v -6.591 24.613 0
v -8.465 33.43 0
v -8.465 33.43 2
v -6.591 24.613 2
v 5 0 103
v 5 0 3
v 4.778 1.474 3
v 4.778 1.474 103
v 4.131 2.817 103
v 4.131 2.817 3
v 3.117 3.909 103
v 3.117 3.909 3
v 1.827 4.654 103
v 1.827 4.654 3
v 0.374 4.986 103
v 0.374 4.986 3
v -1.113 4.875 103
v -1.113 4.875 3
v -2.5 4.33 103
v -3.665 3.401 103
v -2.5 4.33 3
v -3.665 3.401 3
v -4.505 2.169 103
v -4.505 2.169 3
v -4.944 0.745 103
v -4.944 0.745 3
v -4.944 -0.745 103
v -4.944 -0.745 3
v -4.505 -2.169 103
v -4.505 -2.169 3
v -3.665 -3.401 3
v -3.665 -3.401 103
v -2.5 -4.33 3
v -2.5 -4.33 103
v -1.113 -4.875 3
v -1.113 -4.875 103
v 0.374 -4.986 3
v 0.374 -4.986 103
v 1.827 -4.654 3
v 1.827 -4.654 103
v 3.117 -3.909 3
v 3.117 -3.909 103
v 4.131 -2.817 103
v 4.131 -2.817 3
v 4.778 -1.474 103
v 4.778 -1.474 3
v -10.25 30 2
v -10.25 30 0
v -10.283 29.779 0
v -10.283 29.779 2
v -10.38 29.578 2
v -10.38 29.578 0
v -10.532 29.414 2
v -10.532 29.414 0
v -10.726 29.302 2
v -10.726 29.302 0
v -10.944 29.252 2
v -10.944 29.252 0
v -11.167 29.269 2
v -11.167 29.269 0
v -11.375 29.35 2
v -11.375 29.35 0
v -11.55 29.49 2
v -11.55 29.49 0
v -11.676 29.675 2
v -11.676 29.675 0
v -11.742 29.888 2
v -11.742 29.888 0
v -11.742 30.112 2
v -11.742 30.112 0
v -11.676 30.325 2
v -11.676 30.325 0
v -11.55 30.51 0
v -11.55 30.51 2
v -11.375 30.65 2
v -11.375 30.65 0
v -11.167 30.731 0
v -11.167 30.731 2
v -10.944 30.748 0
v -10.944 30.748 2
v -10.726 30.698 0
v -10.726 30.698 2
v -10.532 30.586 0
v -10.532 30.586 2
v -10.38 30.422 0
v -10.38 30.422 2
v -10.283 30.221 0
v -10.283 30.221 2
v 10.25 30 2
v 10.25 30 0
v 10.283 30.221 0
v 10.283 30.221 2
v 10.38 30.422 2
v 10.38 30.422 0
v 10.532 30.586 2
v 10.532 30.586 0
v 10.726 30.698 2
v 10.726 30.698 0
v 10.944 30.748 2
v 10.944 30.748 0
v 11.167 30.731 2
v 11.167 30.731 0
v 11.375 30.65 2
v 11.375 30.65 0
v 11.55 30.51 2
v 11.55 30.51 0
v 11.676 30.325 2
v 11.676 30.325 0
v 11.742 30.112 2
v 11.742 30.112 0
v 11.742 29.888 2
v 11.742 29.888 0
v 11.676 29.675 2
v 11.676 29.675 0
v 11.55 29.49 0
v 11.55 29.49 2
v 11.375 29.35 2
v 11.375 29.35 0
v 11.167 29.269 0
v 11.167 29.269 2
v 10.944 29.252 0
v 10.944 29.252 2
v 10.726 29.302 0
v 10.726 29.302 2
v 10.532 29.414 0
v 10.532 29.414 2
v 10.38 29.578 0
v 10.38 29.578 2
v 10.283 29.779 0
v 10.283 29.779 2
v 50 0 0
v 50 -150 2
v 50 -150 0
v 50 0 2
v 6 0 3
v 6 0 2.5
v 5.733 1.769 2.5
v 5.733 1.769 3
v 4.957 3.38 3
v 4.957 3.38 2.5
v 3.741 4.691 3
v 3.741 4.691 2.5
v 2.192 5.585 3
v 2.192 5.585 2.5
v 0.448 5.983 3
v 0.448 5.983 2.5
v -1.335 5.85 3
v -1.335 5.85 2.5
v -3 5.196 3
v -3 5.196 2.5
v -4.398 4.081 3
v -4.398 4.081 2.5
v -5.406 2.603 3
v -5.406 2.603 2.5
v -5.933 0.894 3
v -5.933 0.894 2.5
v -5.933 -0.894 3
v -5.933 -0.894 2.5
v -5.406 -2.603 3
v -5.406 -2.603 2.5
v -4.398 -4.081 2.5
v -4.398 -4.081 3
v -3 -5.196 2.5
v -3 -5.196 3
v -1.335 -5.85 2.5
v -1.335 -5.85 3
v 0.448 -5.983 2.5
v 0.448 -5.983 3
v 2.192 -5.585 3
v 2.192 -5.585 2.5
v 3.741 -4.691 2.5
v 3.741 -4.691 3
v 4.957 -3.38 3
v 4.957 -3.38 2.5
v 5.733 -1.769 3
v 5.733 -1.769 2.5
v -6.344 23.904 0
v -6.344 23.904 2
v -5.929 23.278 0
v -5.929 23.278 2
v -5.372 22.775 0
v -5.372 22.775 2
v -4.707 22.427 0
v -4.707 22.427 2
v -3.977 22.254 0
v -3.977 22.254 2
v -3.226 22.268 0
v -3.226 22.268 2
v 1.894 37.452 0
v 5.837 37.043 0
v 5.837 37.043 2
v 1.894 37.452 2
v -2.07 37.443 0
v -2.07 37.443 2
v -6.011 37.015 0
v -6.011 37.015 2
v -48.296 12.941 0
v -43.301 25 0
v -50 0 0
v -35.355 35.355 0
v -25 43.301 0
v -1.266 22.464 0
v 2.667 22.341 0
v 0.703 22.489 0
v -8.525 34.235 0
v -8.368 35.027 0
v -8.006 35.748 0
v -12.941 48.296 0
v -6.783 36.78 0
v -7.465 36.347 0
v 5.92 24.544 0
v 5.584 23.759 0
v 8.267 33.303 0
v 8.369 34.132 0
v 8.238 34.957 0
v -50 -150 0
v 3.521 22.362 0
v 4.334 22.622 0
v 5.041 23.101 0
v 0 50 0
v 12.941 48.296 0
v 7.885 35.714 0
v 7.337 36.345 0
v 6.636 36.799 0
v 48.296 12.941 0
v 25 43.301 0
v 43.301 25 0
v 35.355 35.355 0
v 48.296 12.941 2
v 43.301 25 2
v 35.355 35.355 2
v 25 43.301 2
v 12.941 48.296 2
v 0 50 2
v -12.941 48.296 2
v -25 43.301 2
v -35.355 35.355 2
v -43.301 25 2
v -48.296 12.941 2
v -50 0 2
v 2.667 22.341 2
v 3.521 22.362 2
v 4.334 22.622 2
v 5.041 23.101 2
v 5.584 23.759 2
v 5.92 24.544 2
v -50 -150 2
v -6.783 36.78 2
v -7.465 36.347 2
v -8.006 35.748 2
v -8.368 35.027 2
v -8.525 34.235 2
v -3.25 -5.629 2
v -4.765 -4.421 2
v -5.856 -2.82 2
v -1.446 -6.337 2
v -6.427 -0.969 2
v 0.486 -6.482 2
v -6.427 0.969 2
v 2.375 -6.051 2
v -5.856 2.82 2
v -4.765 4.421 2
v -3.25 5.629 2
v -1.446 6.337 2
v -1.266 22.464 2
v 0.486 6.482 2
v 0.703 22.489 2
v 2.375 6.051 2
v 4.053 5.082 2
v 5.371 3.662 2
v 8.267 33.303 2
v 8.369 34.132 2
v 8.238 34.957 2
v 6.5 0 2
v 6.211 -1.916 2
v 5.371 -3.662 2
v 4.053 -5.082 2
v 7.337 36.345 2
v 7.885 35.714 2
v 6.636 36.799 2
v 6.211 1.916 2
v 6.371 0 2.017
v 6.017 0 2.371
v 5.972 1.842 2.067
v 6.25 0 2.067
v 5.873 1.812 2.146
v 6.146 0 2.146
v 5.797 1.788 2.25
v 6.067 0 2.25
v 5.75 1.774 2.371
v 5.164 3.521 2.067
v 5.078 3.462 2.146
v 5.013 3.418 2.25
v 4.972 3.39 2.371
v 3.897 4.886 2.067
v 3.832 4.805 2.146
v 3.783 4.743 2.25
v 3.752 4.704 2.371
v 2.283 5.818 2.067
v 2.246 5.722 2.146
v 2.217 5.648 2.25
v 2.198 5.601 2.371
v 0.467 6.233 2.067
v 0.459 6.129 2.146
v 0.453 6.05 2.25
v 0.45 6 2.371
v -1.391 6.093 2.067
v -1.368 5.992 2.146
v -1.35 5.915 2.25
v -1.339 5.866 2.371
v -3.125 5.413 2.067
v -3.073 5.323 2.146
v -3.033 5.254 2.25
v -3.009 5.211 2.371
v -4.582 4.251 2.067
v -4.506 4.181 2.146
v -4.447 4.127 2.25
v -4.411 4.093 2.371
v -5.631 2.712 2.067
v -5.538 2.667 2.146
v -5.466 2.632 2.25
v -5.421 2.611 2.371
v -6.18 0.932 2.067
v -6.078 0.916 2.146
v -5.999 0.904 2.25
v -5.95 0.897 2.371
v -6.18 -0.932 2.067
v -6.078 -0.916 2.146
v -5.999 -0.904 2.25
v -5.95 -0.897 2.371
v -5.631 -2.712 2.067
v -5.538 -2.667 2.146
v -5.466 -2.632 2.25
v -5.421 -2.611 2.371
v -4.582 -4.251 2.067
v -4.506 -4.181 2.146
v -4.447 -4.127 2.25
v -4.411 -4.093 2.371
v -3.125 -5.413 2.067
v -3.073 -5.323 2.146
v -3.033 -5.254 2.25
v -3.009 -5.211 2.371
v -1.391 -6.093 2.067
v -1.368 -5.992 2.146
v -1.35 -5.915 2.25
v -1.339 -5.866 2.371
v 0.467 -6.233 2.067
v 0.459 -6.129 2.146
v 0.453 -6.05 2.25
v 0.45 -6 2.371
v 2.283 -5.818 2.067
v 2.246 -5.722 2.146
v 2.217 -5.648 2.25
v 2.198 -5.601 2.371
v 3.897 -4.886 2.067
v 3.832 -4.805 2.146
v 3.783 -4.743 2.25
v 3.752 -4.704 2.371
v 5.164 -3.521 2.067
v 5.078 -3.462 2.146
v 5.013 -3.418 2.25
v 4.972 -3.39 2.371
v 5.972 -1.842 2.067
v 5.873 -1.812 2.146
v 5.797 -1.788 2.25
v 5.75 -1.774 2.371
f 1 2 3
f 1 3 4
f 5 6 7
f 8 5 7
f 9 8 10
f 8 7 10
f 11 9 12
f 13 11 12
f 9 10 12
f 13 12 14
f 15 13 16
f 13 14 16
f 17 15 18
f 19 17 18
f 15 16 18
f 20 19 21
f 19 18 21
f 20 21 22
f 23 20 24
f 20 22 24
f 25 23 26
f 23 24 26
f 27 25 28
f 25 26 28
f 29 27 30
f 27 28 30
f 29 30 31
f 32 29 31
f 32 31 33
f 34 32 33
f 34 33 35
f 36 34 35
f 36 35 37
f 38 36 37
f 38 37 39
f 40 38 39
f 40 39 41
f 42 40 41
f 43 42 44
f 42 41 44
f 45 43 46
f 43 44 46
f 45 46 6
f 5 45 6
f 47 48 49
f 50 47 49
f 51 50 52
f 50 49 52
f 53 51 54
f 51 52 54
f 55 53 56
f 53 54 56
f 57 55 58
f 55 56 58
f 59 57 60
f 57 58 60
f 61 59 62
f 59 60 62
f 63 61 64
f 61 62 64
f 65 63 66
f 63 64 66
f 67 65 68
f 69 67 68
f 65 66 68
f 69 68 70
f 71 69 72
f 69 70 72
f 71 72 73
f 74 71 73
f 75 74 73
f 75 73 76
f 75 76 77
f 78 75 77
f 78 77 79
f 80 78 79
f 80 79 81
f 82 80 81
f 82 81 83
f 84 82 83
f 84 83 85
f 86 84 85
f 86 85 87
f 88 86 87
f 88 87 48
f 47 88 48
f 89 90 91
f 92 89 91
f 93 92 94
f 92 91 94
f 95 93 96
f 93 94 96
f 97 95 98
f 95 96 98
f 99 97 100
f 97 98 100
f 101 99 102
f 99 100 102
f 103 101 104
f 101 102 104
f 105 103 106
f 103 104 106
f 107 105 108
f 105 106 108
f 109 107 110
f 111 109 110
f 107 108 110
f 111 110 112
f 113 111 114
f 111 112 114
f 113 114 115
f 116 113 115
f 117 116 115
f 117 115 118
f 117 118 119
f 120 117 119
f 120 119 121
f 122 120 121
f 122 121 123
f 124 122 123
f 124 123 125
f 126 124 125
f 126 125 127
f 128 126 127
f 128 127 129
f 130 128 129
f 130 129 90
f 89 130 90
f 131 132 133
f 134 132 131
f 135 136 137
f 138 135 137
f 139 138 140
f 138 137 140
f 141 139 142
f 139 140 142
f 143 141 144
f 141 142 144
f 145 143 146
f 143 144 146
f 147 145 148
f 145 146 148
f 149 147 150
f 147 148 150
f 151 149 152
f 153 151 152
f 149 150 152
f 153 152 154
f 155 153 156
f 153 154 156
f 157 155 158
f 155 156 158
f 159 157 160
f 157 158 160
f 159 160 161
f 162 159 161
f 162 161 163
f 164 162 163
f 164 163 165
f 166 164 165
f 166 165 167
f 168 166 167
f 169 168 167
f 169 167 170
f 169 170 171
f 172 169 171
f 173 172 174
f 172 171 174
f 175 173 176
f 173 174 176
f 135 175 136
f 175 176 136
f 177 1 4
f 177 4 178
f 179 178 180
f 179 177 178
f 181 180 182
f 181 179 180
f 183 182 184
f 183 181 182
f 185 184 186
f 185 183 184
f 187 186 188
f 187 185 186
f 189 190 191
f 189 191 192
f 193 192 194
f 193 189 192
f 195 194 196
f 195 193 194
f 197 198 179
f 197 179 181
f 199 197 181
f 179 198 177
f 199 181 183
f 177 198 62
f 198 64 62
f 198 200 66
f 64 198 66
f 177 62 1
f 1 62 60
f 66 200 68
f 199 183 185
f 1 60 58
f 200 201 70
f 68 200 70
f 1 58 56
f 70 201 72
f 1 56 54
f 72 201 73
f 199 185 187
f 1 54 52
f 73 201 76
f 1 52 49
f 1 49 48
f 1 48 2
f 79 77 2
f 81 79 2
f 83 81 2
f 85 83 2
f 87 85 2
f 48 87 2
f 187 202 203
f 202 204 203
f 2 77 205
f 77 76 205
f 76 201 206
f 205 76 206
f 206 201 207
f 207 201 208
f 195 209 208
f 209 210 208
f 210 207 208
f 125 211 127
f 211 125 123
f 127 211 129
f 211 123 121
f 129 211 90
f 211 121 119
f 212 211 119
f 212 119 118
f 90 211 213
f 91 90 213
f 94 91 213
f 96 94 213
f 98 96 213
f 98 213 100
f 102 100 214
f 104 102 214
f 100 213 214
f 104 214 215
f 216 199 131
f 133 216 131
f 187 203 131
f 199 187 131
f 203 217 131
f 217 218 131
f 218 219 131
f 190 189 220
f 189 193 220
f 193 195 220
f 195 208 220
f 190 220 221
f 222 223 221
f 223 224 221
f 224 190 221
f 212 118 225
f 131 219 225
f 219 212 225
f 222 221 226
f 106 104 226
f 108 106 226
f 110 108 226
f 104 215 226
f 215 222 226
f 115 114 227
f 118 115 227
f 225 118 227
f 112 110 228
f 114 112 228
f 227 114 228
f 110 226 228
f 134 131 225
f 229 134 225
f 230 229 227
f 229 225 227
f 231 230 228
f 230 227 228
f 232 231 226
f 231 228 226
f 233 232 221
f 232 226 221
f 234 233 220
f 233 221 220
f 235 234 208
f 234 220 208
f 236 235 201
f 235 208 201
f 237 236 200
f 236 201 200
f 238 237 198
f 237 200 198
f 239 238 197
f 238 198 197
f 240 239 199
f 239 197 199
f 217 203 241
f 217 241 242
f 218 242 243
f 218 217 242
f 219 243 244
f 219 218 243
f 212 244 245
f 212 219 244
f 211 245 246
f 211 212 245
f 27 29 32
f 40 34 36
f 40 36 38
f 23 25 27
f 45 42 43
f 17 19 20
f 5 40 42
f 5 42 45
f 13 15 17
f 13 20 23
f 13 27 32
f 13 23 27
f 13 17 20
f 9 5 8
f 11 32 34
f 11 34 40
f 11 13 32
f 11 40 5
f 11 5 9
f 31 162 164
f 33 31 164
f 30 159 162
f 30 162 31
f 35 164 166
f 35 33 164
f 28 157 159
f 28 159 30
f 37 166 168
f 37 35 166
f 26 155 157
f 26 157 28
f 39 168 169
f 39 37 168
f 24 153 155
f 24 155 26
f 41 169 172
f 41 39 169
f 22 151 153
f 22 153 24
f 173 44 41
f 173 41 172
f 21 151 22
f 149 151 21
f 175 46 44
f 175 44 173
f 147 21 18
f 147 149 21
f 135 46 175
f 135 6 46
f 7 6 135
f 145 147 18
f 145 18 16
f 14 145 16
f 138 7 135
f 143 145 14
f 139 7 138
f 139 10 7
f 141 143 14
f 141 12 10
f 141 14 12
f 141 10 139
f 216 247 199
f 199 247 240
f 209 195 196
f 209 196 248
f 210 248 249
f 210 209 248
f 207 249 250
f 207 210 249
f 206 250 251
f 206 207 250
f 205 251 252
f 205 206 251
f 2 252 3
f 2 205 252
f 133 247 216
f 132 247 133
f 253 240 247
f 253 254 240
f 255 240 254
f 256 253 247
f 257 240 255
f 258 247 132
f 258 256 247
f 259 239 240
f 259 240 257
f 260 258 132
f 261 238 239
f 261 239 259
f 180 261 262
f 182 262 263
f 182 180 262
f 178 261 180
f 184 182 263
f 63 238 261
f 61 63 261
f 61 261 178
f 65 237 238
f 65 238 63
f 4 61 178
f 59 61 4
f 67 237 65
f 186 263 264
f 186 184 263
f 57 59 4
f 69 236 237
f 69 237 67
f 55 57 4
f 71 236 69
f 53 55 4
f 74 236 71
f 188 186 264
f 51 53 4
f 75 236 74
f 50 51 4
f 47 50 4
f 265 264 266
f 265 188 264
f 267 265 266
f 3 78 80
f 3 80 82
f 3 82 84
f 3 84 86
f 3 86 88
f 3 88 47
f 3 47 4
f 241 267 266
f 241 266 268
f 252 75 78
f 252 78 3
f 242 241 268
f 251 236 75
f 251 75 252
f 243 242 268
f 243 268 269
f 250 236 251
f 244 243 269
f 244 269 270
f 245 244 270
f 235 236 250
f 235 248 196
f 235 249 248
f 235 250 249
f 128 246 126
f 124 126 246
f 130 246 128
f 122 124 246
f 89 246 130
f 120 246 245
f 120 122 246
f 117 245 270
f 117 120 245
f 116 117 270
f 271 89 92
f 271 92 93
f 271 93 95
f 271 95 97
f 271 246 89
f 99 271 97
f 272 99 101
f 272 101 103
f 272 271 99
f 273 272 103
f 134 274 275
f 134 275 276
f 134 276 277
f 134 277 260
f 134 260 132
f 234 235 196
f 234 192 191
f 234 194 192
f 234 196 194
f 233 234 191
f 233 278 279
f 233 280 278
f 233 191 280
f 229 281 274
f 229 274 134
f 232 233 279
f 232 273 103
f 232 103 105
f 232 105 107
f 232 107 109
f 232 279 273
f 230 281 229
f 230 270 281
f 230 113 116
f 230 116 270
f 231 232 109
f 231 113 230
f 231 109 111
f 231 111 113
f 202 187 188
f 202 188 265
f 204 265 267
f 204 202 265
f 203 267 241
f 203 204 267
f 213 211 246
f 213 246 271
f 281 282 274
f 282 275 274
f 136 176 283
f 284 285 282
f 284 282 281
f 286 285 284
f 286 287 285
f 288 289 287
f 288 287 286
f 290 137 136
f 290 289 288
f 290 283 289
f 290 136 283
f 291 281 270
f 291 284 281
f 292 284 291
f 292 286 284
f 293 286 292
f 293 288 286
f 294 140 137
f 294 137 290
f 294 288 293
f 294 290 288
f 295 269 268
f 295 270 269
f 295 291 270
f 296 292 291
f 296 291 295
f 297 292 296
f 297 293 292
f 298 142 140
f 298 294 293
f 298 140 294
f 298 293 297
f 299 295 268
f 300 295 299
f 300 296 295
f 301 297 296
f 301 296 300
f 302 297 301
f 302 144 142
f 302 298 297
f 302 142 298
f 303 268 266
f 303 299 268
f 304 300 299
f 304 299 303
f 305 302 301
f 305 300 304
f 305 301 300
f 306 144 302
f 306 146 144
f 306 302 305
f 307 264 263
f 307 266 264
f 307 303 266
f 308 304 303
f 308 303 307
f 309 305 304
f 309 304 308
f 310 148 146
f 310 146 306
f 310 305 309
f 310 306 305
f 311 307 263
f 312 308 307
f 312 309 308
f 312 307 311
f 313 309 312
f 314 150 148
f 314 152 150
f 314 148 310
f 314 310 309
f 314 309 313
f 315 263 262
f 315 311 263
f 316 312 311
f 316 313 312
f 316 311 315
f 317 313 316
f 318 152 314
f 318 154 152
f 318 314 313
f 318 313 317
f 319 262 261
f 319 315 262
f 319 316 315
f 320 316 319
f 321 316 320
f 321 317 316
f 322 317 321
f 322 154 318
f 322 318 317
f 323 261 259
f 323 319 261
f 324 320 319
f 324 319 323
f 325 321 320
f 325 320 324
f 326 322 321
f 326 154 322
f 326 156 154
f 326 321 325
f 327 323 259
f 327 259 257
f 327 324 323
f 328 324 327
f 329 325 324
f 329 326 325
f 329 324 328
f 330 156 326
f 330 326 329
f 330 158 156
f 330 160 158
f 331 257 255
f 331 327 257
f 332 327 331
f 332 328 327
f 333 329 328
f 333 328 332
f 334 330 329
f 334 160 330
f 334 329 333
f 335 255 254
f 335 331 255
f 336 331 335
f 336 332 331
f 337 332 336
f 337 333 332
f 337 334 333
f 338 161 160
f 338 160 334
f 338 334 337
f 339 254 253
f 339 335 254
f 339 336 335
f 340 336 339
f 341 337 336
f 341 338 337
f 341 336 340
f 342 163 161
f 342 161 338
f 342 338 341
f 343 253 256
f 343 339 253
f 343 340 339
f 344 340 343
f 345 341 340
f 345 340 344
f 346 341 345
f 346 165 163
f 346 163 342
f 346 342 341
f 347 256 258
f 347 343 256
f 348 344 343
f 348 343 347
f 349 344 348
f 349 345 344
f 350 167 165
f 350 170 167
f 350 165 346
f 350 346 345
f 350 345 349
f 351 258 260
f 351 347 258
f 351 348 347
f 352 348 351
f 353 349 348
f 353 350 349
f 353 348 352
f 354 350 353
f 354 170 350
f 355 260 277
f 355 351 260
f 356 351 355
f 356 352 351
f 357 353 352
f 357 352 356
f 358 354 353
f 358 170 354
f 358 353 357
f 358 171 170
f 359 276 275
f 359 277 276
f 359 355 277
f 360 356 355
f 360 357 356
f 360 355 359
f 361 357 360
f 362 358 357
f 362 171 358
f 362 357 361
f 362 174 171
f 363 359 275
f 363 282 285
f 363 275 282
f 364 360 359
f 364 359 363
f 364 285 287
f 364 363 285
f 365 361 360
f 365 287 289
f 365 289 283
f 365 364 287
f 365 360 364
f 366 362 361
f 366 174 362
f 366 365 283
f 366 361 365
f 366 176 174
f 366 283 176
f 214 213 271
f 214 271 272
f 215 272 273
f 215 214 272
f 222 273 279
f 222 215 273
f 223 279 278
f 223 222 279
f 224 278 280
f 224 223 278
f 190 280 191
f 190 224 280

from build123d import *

# Parameters (mm, degrees)
SKETCH_1_R          = 50
EXTRUDE_1_DEPTH     = 2
SKETCH_2_R          = 6
EXTRUDE_2_DEPTH     = 1
SKETCH_3_R          = 5
EXTRUDE_3_DEPTH     = 100
FILLET_1_R          = 0.5
SKETCH_4_R          = 0.75
CUT_EXTRUDE_1_DEPTH = 10
SKETCH_5_W          = 100
SKETCH_5_H          = 150
EXTRUDE_4_DEPTH     = 2


with BuildPart() as part:
    # 草图1 → 凸台-拉伸1 (new body)
    with BuildSketch(Plane.XY):
        Circle(SKETCH_1_R)
        with BuildLine():
            Line((-8.46489845, 33.430105538), (-6.59071788, 24.612779199))
            ThreePointArc((-6.59071788, 24.612779199), (-5.371774848, 22.775404656), (-3.226125068, 22.267512592))
            ThreePointArc((-3.226125068, 22.267512592), (-0.282003378, 22.498232688), (2.666976337, 22.341379483))
            ThreePointArc((2.666976337, 22.341379483), (4.704329655, 22.835940411), (5.920350661, 24.543772946))
            Line((5.920350661, 24.543772946), (8.267408601, 33.303112428))
            ThreePointArc((8.267408601, 33.303112428), (7.884986755, 35.714496485), (5.836555568, 37.043010395))
            ThreePointArc((5.836555568, 37.043010395), (-0.088516087, 37.499895532), (-6.011364834, 37.015044142))
            ThreePointArc((-6.011364834, 37.015044142), (-8.006158275, 35.748212618), (-8.46489845, 33.430105538))
        make_face(mode=Mode.SUBTRACT)
    extrude(amount=EXTRUDE_1_DEPTH)

    # 草图2 → 凸台-拉伸2 (add)
    with BuildSketch(Plane.XY.offset(2)):
        Circle(SKETCH_2_R)
    extrude(amount=EXTRUDE_2_DEPTH)

    # 草图3 → 凸台-拉伸3 (add)
    with BuildSketch(Plane.XY.offset(3)):
        Circle(SKETCH_3_R)
    extrude(amount=EXTRUDE_3_DEPTH)

    # 圆角1
    fillet_1_edges = [part.edges().sort_by_distance(p)[0] for p in [
        (-6, 0, 2),
    ]]
    fillet(fillet_1_edges, radius=FILLET_1_R)

    # 草图4 → 切除-拉伸1 (cut)
    with BuildSketch(Plane(origin=(0, 0, 0), x_dir=(-1, 0, 0), z_dir=(0, 0, -1))):
        with Locations((-11, 30)):
            Circle(SKETCH_4_R)
        with Locations(Location((11, 30, 0), (0, 0, 180))):
            Circle(SKETCH_4_R)
    extrude(amount=-CUT_EXTRUDE_1_DEPTH, mode=Mode.SUBTRACT)

    # 草图5 → 凸台-拉伸4 (add)
    with BuildSketch(Plane.XY.offset(2)):
        with Locations((0, -75)):
            Rectangle(SKETCH_5_W, SKETCH_5_H)
    extrude(amount=-EXTRUDE_4_DEPTH)


solid = part.part
